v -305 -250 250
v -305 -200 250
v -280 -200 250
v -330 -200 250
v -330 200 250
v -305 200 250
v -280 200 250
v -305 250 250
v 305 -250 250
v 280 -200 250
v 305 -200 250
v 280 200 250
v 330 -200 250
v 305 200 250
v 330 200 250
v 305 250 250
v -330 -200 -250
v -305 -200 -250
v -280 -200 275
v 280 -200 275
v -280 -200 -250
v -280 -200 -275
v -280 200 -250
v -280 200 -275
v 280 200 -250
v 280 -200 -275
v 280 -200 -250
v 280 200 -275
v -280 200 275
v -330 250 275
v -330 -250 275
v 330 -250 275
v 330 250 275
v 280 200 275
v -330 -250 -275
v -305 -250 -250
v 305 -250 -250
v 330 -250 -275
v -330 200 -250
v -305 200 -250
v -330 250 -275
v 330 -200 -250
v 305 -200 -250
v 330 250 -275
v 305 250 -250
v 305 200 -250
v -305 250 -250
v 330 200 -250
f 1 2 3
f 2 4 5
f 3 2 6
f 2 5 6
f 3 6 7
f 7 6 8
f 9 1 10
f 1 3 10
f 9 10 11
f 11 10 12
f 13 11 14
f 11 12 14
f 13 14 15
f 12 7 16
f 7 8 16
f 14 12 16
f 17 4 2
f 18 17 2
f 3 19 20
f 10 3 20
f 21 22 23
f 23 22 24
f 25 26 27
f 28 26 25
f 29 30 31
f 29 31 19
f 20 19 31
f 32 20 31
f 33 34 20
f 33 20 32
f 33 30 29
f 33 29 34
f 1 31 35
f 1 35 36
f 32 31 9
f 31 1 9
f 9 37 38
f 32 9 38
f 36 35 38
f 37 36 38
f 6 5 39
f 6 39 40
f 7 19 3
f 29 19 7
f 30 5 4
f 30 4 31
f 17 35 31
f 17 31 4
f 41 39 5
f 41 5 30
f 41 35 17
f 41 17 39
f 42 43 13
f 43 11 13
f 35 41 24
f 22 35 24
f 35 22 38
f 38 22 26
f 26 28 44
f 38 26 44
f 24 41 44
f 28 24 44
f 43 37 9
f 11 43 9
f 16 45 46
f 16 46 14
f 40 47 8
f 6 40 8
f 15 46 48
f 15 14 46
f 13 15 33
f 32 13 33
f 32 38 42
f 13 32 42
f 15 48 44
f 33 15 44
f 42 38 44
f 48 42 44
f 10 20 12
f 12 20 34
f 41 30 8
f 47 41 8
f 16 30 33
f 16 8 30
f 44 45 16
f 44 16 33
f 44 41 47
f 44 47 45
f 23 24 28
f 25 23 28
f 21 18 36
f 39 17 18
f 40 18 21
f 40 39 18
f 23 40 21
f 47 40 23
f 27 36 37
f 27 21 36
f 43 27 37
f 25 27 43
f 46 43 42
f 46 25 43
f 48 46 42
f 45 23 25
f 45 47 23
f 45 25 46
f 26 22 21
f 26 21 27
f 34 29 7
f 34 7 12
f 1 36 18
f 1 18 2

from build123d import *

# Parameters (mm, degrees)
F1_W      = 660
F1_H      = 500
F1_W_2    = 560
F1_H_2    = 400
F2_DEPTH  = 25
F4_W      = 660
F4_H      = 500
F4_W_2    = 560
F4_H_2    = 400
F5_DEPTH  = 25
F8_W      = 660
F8_H      = 550
F8_W_2    = 610
F8_H_2    = 500
F9_DEPTH  = 50
F10_W     = 660
F10_H     = 550
F10_W_2   = 610
F10_H_2   = 500
F11_DEPTH = 50


with BuildPart() as f2:
    # F1 (on offset) → F2 (new body)
    with BuildSketch(Plane.XY.offset(275)):
        Rectangle(F1_W, F1_H)
        Rectangle(F1_W_2, F1_H_2, mode=Mode.SUBTRACT)
    extrude(amount=-F2_DEPTH)



with BuildPart() as f5:
    # F4 (on offset) → F5 (new body)
    with BuildSketch(Plane.XY.offset(-275)):
        Rectangle(F4_W, F4_H)
        Rectangle(F4_W_2, F4_H_2, mode=Mode.SUBTRACT)
    extrude(amount=F5_DEPTH)


with BuildPart() as f2_1:
    add(f2.part)

    add(f5.part)  # F9 merges F5
    # F8 (on offset) → F9 (join)
    with BuildSketch(Plane.XZ.offset(250)):
        Rectangle(F8_W, F8_H)
        Rectangle(F8_W_2, F8_H_2, mode=Mode.SUBTRACT)
    extrude(amount=-F9_DEPTH)

    # F10 (on offset) → F11 (join)
    with BuildSketch(Plane.XZ.offset(-250)):
        Rectangle(F10_W, F10_H)
        Rectangle(F10_W_2, F10_H_2, mode=Mode.SUBTRACT)
    extrude(amount=F11_DEPTH)


solid = f2_1.part
